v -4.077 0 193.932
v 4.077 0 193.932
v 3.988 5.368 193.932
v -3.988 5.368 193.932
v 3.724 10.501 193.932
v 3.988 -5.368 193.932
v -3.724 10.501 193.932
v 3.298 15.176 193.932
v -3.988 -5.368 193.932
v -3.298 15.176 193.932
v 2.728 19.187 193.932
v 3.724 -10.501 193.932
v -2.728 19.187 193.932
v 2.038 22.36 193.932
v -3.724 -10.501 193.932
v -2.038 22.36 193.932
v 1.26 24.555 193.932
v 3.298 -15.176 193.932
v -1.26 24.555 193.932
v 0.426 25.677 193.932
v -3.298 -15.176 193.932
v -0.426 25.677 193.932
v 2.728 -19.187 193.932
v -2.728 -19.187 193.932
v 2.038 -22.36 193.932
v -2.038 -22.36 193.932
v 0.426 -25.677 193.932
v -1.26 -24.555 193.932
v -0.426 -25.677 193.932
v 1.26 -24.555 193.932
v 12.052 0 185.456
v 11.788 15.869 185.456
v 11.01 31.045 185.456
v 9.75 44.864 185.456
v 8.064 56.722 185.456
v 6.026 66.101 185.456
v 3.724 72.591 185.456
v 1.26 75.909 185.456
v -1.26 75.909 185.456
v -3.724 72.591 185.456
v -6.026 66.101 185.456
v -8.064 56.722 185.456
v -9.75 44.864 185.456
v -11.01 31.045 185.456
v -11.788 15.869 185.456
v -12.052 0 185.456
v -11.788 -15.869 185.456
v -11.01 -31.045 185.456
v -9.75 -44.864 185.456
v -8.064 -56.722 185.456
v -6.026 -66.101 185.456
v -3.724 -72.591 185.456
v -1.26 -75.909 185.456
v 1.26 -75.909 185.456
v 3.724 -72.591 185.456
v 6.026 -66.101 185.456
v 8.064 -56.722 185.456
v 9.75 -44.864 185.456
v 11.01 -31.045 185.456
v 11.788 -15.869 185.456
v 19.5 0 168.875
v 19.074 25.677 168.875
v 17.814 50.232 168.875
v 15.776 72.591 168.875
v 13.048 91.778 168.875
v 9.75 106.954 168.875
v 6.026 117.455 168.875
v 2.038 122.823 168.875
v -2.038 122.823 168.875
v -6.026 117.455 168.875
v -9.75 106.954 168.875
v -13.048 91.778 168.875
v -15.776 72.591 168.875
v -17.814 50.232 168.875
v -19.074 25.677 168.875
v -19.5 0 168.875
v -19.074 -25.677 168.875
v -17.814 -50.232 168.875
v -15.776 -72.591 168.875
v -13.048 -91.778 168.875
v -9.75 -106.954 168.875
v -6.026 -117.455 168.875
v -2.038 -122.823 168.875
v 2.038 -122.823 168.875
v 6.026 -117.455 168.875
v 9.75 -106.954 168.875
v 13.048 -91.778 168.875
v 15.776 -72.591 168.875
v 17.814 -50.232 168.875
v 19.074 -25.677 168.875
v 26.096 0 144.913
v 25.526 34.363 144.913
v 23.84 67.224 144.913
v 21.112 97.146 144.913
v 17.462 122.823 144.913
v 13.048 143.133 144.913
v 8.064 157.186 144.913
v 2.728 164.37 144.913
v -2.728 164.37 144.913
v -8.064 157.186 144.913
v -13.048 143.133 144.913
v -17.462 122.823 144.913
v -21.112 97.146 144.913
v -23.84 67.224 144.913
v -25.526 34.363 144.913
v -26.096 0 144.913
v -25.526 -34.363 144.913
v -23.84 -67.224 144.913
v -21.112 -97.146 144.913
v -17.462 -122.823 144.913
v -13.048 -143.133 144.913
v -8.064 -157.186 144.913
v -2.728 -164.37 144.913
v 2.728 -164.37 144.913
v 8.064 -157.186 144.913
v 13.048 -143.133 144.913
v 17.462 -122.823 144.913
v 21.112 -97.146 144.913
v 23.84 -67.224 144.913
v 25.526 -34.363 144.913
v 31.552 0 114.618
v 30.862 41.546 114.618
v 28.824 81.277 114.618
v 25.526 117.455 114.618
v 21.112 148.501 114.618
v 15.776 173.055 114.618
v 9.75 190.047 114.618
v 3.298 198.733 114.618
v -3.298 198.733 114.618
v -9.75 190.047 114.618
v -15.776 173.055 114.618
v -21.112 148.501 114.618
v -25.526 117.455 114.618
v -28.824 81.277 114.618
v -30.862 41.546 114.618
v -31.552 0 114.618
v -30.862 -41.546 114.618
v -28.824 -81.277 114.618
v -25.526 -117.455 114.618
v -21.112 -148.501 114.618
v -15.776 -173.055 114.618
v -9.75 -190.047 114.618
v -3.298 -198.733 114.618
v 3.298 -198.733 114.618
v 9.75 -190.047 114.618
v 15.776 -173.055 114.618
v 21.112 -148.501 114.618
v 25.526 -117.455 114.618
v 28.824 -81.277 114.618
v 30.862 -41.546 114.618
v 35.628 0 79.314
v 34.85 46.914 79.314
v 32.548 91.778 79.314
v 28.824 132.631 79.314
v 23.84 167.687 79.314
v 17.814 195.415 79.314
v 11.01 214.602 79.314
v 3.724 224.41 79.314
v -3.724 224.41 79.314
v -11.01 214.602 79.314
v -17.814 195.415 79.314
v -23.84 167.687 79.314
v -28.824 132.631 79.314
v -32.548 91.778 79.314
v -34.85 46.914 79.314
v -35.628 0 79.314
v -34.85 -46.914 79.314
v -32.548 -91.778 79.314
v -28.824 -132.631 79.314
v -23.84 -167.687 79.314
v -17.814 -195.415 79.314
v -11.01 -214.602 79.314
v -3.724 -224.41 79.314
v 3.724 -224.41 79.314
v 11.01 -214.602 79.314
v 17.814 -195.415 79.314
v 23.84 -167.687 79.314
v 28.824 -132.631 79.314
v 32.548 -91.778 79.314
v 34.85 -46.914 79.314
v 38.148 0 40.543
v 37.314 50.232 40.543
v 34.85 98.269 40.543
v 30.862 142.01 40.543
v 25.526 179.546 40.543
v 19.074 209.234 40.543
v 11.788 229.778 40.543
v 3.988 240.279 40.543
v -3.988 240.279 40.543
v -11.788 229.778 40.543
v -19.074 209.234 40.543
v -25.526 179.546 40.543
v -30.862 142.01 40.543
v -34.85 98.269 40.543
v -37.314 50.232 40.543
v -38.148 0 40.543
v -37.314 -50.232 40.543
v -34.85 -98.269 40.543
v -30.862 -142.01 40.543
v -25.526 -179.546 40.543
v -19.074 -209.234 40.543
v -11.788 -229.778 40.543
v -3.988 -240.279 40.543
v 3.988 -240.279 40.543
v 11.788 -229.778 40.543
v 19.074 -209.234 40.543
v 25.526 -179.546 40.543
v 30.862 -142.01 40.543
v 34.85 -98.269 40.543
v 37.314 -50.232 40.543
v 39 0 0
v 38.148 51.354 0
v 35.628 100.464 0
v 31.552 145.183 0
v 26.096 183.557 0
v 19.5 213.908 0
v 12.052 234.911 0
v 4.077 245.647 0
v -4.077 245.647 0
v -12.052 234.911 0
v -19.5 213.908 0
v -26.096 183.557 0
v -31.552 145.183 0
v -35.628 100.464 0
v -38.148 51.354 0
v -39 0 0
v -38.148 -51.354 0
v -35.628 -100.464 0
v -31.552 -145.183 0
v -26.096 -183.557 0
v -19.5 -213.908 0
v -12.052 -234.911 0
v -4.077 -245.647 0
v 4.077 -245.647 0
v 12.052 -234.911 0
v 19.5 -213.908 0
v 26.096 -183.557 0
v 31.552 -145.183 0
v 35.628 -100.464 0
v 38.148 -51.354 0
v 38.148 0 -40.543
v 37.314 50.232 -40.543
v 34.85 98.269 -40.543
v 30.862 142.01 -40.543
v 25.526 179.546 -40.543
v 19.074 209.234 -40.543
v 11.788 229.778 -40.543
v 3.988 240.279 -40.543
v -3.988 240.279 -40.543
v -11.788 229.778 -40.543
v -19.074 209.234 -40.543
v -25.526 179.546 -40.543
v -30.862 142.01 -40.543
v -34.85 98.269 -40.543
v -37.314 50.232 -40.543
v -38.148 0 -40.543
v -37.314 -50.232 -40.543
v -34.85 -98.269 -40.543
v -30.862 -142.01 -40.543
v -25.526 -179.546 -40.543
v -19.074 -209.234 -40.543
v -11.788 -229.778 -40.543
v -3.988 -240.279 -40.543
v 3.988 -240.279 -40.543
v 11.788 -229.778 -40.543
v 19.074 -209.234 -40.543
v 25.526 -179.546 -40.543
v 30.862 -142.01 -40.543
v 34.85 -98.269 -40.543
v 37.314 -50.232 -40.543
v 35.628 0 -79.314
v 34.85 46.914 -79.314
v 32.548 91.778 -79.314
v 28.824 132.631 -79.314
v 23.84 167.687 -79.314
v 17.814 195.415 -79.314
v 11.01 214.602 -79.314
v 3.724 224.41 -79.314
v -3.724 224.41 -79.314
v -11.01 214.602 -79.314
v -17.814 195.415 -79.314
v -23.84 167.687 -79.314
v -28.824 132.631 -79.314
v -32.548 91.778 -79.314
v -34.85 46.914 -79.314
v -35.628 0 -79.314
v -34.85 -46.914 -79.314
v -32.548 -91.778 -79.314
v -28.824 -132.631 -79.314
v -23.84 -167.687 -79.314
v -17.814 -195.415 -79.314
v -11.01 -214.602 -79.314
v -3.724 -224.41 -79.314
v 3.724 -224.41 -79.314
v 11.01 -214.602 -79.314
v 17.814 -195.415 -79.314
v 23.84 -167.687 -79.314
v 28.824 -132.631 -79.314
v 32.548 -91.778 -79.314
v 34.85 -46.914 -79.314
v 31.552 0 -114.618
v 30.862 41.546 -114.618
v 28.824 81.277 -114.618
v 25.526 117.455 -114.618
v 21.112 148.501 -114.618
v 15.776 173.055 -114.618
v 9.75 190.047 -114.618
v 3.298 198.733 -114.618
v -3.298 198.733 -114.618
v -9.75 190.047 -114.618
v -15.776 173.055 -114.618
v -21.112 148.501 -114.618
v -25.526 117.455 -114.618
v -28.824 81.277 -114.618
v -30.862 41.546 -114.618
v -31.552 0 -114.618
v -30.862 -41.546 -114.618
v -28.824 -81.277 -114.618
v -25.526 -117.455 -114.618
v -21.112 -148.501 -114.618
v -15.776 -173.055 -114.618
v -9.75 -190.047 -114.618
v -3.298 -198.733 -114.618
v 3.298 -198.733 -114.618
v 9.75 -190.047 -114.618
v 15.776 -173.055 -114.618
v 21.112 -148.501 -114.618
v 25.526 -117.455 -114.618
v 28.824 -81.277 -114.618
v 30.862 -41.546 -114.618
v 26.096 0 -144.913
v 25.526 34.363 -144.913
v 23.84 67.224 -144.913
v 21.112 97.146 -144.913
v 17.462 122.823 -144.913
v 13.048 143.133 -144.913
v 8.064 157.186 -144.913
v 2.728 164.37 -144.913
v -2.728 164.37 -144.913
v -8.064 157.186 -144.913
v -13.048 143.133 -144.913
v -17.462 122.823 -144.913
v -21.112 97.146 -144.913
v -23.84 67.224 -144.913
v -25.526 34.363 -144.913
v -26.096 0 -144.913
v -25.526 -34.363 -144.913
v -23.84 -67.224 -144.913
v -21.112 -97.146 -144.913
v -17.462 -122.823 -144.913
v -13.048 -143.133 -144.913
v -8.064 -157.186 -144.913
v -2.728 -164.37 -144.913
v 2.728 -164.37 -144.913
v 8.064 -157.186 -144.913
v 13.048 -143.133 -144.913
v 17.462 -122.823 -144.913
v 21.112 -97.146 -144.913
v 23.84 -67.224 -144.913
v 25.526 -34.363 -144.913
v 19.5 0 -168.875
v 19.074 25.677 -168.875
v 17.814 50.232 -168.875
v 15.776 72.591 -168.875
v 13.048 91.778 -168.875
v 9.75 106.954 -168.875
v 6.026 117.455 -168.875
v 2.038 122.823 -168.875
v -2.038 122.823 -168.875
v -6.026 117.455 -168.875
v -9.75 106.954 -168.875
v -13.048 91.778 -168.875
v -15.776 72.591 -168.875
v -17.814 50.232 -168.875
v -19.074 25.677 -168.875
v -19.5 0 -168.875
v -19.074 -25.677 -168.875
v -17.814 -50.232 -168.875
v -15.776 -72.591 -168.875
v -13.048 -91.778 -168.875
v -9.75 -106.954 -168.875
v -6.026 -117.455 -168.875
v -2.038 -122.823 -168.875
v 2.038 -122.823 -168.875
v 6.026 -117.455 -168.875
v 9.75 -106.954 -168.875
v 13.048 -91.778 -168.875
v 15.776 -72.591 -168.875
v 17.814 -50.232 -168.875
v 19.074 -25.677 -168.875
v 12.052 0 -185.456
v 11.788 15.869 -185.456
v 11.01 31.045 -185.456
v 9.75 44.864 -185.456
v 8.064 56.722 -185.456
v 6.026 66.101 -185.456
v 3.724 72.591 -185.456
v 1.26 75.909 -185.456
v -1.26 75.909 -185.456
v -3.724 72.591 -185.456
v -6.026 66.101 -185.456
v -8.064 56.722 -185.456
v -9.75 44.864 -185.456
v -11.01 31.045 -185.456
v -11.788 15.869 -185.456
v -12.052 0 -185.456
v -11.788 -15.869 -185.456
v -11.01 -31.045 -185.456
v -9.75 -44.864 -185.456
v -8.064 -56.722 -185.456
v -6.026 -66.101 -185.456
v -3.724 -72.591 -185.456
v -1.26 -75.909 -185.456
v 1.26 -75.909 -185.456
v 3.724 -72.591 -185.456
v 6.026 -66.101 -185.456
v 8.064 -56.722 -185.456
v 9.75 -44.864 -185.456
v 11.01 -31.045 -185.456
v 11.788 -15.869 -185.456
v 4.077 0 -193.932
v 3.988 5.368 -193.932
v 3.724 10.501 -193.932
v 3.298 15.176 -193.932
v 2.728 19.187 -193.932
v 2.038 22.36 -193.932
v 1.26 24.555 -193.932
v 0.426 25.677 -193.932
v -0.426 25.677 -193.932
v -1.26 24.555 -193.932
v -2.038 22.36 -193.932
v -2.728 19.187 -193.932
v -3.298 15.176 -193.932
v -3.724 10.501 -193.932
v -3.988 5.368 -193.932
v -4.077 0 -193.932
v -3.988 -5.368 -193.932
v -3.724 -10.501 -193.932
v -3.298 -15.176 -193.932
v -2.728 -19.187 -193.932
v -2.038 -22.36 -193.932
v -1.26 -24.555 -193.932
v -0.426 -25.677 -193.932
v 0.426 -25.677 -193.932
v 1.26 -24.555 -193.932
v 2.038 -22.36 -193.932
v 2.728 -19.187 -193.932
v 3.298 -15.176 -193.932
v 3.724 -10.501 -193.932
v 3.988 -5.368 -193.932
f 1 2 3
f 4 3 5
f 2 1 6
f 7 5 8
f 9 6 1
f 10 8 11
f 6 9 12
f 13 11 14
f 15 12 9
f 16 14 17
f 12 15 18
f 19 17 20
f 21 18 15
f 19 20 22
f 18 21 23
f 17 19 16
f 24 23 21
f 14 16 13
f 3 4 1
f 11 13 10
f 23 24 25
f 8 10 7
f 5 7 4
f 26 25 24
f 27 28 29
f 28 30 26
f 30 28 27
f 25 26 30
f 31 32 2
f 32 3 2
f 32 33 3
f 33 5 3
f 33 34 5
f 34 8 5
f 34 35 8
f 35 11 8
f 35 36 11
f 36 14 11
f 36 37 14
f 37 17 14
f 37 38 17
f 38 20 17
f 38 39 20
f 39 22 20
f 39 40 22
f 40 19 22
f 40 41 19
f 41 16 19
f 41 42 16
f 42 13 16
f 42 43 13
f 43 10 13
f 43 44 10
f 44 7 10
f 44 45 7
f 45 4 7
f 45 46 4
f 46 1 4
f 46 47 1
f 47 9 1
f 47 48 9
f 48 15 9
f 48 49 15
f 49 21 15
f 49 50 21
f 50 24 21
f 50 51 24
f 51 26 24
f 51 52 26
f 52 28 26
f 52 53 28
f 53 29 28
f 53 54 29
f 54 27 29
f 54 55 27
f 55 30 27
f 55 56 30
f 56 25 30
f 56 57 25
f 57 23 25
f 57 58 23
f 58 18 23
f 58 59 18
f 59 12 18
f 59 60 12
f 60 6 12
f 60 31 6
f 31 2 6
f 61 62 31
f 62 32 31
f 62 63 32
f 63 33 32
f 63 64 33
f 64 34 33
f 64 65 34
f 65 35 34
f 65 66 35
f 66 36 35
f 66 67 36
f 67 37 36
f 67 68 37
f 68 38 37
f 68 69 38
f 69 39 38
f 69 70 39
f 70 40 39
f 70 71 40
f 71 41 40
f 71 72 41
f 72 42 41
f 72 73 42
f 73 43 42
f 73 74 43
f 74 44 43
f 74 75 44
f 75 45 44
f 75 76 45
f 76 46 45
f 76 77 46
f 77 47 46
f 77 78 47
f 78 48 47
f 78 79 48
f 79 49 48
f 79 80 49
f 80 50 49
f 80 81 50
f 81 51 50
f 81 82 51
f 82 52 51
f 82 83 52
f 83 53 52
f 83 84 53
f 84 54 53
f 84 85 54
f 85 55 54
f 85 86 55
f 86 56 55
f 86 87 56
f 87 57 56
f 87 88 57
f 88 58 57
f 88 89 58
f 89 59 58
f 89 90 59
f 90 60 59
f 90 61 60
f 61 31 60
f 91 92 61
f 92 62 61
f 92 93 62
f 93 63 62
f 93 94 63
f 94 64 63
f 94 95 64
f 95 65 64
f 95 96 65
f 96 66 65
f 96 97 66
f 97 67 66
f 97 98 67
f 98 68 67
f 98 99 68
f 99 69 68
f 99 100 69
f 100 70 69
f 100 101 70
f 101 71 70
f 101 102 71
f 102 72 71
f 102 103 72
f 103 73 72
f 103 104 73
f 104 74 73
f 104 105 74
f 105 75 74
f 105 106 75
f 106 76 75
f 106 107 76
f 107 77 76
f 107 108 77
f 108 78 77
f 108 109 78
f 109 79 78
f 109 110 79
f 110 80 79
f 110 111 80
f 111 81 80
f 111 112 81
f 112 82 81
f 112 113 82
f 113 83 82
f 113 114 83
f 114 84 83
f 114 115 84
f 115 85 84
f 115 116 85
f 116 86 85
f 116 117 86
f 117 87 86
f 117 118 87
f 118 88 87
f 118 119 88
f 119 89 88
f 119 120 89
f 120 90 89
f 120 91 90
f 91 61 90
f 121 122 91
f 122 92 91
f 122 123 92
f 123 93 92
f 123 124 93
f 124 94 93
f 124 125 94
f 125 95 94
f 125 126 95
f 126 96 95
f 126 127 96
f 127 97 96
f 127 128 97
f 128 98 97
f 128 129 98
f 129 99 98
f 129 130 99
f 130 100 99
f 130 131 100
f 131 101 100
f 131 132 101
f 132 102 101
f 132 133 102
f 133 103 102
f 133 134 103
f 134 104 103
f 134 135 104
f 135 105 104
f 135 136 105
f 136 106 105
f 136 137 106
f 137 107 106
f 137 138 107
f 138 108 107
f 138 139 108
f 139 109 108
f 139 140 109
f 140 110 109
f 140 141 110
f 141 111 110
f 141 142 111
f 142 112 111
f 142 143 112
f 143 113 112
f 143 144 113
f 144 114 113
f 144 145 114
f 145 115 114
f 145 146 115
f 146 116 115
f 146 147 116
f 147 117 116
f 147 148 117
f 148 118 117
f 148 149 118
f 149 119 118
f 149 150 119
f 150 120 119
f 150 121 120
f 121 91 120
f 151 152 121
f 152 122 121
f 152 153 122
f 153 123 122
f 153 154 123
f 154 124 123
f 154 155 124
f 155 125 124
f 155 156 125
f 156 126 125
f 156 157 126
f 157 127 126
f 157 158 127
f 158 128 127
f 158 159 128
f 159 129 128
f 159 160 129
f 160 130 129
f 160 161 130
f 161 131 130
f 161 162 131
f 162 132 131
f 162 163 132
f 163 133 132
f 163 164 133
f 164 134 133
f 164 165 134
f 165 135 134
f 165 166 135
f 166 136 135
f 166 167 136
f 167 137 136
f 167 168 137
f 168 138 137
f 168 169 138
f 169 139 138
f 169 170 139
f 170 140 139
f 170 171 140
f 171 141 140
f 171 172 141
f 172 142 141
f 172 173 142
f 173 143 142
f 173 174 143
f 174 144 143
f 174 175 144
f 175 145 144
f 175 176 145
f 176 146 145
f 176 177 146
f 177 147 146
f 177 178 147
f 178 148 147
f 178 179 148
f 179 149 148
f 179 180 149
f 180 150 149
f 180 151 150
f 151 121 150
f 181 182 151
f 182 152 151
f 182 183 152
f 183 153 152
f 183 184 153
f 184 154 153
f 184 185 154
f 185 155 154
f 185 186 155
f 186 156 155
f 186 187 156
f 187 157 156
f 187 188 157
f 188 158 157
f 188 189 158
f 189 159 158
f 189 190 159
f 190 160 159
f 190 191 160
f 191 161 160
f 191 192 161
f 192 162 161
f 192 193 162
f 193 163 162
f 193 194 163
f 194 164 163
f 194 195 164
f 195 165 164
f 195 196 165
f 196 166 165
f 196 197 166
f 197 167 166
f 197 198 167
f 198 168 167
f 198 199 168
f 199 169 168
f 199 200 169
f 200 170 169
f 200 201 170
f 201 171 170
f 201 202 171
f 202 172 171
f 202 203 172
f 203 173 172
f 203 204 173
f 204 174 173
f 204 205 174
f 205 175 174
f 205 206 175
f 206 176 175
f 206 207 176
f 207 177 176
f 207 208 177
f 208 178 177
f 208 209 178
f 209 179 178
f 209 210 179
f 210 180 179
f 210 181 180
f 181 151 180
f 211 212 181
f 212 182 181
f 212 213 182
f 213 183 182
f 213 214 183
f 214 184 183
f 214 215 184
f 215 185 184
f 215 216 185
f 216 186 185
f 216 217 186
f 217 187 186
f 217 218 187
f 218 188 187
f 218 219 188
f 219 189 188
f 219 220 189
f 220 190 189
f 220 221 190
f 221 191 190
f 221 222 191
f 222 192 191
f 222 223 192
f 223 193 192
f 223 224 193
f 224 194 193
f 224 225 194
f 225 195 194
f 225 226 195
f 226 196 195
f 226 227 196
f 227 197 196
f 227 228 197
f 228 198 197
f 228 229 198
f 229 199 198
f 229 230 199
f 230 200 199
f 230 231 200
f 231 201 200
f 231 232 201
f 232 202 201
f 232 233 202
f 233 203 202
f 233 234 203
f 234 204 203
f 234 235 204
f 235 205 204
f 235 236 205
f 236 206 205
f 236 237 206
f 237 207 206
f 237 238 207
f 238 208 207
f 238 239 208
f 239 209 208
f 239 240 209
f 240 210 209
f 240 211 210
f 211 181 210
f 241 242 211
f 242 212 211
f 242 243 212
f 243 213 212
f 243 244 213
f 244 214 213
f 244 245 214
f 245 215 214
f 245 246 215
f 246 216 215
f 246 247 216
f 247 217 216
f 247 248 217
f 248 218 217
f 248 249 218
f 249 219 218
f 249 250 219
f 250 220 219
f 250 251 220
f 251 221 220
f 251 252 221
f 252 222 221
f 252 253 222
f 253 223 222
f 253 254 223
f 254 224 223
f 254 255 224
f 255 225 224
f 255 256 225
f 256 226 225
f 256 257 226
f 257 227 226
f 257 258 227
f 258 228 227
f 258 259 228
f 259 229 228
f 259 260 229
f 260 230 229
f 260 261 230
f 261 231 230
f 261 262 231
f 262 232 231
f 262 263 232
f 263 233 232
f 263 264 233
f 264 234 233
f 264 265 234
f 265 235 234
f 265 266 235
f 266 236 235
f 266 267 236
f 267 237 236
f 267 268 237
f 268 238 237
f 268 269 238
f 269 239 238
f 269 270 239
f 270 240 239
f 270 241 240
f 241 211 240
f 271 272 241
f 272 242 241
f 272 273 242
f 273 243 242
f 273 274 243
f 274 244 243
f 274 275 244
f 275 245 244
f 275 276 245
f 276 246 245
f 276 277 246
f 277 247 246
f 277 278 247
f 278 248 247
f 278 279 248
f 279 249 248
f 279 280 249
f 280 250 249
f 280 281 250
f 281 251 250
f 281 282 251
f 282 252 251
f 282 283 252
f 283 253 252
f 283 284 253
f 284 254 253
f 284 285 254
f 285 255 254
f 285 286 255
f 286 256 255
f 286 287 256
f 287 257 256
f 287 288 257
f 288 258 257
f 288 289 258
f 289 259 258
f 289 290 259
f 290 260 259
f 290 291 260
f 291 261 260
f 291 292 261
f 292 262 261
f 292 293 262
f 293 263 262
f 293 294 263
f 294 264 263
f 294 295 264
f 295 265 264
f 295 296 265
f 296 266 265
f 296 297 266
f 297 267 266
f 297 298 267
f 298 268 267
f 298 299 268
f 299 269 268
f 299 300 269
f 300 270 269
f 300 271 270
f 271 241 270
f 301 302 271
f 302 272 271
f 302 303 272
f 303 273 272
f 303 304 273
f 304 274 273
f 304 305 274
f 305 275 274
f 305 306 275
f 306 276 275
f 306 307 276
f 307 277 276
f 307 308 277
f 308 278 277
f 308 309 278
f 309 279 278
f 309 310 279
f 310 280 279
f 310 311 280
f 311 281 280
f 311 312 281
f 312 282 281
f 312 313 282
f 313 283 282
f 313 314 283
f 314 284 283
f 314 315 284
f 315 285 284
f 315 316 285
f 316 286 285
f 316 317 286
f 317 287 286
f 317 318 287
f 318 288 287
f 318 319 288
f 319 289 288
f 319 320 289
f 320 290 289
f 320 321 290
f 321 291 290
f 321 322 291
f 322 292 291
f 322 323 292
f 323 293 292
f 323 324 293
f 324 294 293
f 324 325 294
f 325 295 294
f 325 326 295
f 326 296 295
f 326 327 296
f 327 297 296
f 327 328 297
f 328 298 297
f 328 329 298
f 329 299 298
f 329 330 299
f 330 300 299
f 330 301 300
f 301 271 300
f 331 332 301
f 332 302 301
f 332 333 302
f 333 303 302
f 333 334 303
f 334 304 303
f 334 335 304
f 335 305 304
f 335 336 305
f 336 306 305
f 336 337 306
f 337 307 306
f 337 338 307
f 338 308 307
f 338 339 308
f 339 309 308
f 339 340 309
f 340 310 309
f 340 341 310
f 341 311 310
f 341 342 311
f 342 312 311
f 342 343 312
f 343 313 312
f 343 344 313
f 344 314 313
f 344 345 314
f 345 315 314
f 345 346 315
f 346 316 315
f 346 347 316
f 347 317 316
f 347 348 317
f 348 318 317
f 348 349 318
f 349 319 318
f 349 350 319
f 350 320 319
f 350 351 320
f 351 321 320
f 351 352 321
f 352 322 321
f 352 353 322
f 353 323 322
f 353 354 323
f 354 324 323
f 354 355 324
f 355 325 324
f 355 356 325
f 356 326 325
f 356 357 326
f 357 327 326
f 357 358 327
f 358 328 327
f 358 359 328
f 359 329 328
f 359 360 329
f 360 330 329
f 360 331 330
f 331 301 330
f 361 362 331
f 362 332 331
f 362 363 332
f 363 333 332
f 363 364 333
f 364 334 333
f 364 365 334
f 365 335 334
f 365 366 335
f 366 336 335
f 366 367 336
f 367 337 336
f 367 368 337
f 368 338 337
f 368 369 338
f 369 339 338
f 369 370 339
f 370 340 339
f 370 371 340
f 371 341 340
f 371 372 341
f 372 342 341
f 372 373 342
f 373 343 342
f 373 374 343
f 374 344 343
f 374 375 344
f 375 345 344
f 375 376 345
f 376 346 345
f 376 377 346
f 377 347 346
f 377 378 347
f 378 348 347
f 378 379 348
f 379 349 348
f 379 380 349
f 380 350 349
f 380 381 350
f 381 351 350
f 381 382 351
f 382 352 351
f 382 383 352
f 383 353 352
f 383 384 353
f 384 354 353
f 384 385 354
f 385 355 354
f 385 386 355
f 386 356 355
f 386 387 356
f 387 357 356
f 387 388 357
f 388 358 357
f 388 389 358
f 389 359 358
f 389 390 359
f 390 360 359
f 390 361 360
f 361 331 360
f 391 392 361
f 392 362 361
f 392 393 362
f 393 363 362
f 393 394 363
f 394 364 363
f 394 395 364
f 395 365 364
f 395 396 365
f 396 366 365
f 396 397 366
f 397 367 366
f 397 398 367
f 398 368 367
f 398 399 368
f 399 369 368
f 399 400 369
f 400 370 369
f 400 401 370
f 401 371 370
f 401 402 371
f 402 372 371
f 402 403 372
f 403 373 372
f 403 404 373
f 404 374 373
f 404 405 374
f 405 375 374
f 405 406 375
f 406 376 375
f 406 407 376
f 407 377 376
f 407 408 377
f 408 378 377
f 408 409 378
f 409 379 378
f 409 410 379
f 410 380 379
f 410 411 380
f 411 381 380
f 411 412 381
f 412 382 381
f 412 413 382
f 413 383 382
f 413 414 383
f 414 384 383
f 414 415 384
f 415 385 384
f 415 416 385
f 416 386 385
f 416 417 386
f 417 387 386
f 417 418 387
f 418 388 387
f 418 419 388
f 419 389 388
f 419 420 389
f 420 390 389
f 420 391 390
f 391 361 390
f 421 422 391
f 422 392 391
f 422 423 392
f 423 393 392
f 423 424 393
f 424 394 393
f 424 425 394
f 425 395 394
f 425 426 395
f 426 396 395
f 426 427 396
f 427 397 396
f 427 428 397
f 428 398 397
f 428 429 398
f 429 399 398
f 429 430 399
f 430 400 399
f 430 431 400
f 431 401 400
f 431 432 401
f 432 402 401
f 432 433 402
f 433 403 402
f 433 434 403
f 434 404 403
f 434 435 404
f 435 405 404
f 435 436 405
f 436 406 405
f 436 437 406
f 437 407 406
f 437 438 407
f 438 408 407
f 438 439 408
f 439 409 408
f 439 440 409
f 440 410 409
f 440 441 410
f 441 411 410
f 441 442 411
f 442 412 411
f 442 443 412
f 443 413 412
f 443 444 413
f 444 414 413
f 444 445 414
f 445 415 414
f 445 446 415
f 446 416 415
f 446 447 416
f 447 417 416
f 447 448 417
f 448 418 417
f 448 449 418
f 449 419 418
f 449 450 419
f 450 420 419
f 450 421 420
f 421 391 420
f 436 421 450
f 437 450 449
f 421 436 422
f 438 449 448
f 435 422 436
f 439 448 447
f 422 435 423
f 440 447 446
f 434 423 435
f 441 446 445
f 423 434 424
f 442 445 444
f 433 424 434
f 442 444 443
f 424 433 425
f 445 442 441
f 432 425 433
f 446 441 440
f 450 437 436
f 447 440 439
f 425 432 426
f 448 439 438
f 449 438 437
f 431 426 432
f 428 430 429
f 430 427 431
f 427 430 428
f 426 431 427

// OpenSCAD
// Generated by SolidPython 1.0.1 on 2020-07-29 00:46:46


scale(v = [3, 19, 15]) {
	sphere(r = 13);
}
/***********************************************
*********      SolidPython code:      **********
************************************************
 
# import packages: SolidPython
from solid import *
from solid.utils import *
from itertools import chain, combinations, permutations


class Resize:

    def __init__(self, scad_file):
        self.scad_file = scad_file
        #self.scad_file = import_scad(scad_file)
        # cone/cylinder param:
        self.r1 = 0
        self.r2 = 0
        self.h = 0
        # rectangular prism param:
        self.w = 0
        self.l = 0
        # ellipse param:
        self.r = 0

    # import OpenScad code (file name corresponds to shape)


    # classify shape + parameters
    def assign(self, param1, param2, param3):
        if self.scad_file == 'cone.scad':
            self.r1 = param1
            self.r2 = param2
            self.h = param3
        elif self.scad_file == 'cylinder.scad':
            self.r1 = param1
            self.r2 = param2
            self.h = param3
        elif self.scad_file == 'rectangularPrism.scad':
            self.h = param1
            self.l = param2
            self.w = param3
        else:
            self.r = param1
            self.h = param2

    # resize parameters
    def iterate(self):
        x = range(3, 20, 2)
        i = 1
        if self.scad_file == 'cone.scad':
            tempList = list(permutations(x, 2))
            for temp in tempList:
                param1 = temp[0]
                param2 = temp[1]
                filepath = 'produced_scad_files/' + 'cone' + str(param1) + '_' + str(param2) + '_' + '.scad'
                scad_render_to_file(cylinder(h=param1, r1=param2, r2=0), filepath)

        elif self.scad_file == 'cylinder.scad':
            tempList = list(permutations(x, 3))
            for temp in tempList:
                param1 = temp[0]
                param2 = temp[1]
                filepath = 'produced_scad_files/' + 'cylinder' + str(param1) + '_' + str(param2) + '_' + '.scad'
                scad_render_to_file(cylinder(h=param1, r1=param2, r2=param2), filepath)

        elif self.scad_file == 'rectangularPrism.scad':
            tempList = list(permutations(x, 3))
            for temp in tempList:
                param1 = temp[0]
                param2 = temp[1]
                param3 = temp[2]
                filepath = 'produced_scad_files/' + 'rectangularPrism' + str(param1) + '_' + str(param2) + '_' + str(
                    param3) + '.scad'
                scad_render_to_file(cube(size=(param1, param2, param3)), filepath)

        elif self.scad_file == 'ellipse.scad':
            tempList = list(permutations(x, 4))
            for temp in tempList:
                param1 = temp[0]
                param2 = temp[1]
                param3 = temp[2]
                param4 = temp[3]
                filepath = 'produced_scad_files/' + 'ellipse' + str(param1) + '_' + str(param2) + '_' + str(param3) + '_' + str(param4) + '.scad'
                scad_render_to_file(scale([param1, param2, param3])(sphere(r=param4)), filepath)

    def render_to_scadfile(self):
        scad_render_to_file(scad, 'example.scad') 
 
************************************************/
